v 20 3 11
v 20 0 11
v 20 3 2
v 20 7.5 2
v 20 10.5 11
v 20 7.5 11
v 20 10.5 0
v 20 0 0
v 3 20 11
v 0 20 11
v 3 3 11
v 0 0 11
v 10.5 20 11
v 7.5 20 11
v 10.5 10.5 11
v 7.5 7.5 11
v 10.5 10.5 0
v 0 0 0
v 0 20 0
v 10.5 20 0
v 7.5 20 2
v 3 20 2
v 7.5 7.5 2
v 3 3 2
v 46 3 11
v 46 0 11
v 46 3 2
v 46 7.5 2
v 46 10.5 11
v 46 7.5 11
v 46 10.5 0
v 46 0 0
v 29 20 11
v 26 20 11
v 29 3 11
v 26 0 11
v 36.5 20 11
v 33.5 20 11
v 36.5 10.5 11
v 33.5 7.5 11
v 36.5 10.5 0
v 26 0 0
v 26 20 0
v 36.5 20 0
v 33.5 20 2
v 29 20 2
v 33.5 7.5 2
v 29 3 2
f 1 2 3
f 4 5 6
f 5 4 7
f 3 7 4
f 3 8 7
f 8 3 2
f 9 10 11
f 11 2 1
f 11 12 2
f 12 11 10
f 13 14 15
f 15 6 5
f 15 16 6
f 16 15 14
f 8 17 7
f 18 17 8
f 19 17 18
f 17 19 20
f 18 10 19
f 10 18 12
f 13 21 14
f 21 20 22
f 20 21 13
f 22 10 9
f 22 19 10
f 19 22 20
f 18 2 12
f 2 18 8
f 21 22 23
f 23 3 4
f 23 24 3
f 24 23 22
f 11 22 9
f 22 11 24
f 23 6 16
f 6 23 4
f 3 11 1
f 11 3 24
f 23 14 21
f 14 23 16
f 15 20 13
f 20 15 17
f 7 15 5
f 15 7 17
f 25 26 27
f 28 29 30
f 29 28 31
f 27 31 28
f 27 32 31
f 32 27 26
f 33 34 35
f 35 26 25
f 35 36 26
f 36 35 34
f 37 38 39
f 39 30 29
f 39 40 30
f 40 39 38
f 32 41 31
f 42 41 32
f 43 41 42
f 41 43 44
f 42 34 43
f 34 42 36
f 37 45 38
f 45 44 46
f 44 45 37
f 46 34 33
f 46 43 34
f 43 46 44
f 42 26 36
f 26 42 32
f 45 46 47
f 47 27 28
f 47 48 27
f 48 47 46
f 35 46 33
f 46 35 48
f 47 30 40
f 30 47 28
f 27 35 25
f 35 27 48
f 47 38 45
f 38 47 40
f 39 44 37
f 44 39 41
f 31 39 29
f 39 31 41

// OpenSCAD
//Parametric Corner bracket to hold 2 3/16" thick foam core sheets together
//
//By changing the Gap variable,
//You should be able to use with other material:
//like Acrylic, Glass, Plywood, etc.
//
//As well as 90 corners,
//this can do 7 other angles for 3, 5, 6, 8, 9, 10 & 12 sided structures
//11/21/2015    By: David Bunch

//CUSTOMIZER VARIABLES

//1. Length of Corner Backet
CornerLen = 20;

//2. Width of Corner Bracket
CornerWid = 20;         //For Corner_Ang other than 90, CornerLen is used for both sides

//3. Height of Corner Bracket
CornerHt = 9;

//4. Thickness of Face of Connector
BaseThk = 2.0;

//5. Thickness of Side Walls
Thk = 3;

//6. Gap that Foam core board fits in between
Gap = 4.5;

//7. Angle At Corner (Only 90 when Connect_Qty = 3)
Corner_Ang = 90;        //90 = 4 Sided Structure
                        //120 = 3 Sided
                        //72 = 5 Sided
                        //60 = 6 Sided
                        //Not bothering with 7 sided
                        //45 = 8 Sided
                        //40 = 9 Sided
                        //36 = 10 Sided
                        //Not bothering with 11 Sided
                        //30 = 12 Sided
//8. Length of Foam Core (For Assembly Display)
FC_Len = 100;

//9. Width of Foam Core (For Assembly Display)
FC_Wid = 60;

//10. Height of Foam Core (For Assembly Display)
FC_Ht = 40;

//11. Foam Core Thickness (For Assembly Display)
FC_Thk = Gap;

//12. How many corners to Draw (1,2,4 or 8)
Qty = 2;            //Only used if Assembly = 0

//13. Number of Connections (2 or 3)
Connect_Qty = 2;        //Can only use 3 when Corner Angle is 90

//14. Draw Assembled (1 = Yes, 0 = No)
Assembly = 0;           //1 = Show Assembled, 0 = No

//CUSTOMIZER VARIABLES END

TopMul = (Connect_Qty - 2);         //0 if connecting 2 sides at corner
                                    //1 if connecting 3 sides at corner
echo("TopMul = ",TopMul);
TopThk = (BaseThk * TopMul);
echo("TopThk = ",TopThk);
TopGap = (Gap * TopMul);
echo("TopGap = ",TopGap);
TopTotThk = TopThk + TopGap + (Thk * TopMul);
echo("TopTotThk = ",TopTotThk);

TotHt = BaseThk + TopGap + TopThk + CornerHt;   //Total Height of Corner Bracket
echo("TotHt = ", TotHt);
TotThk = Thk + Gap + Thk;
CutCubeHt = TotHt - TopTotThk + 1;

//Calculate Corner support when printing a Connect 3
Ang45_Wid = sqrt((Thk * Thk) + (Thk * Thk));
Ang45_Len = Ang45_Wid * 2;
Y_Offset = cos(45) * TotHt;

//Calculations for Corner_Ang other than 90
Y_Center = tan(60) * CornerLen;

echo("Y_Center = ",Y_Center);
Corner_Rad = CornerLen / cos(60);
echo("Corner_Rad = ",Corner_Rad);
Corner_Dia = Corner_Rad * 2;
echo("Thk = ", Thk);
Corner_Dia_x2 = Corner_Dia * 2;
Thk_DiagLen = Thk / sin(60);
echo("Thk_DiagLen = ",Thk_DiagLen);
Gap_DiagLen = Gap / sin(60);
echo("Gap_DiagLen = ",Gap_DiagLen);
Sides = 360 / Corner_Ang;
echo("Sides = ", Sides);
In_Rad = Corner_Rad - (Thk_DiagLen * 2) - Gap_DiagLen;
In_Dia = In_Rad * 2;
echo("In_Rad = ",In_Rad);

module Corner()
{
    if (Corner_Ang == 90)
    {
    difference()
    {
        cube([CornerLen,CornerWid,TotHt]);      //Draw the Basic corner to start

        translate([Thk,Thk,BaseThk])        
        cube([CornerLen,Gap,TotHt]);            //Cut out where the length side connects
    
        translate([Thk,Thk,BaseThk])
        cube([Gap,CornerWid,TotHt]);            //Cut out where the Width side connects
        if (Connect_Qty == 2)
        {
            translate([TotThk,TotThk,-1])
            cube([CornerLen,CornerWid,CutCubeHt+1]);  //Cut off the inside corner
        } else {
            translate([TotThk,TotThk,BaseThk+Gap+Thk])
            cube([CornerLen,CornerWid,CutCubeHt]);    //Cut off the inside corner
            translate([TotThk,TotThk,BaseThk])
            cube([CornerLen,CornerWid,Gap]);
        }
    }
    } else {
        difference()
        {
            CylRot(Corner_Rad,TotHt);

            translate([0,0,-1])
            CylRot(In_Dia/2,TotHt+2);

            translate([0,0,BaseThk])
            GapAngCut();
            if (Corner_Ang == 120)
            {
                rotate([0,0,-36])
                translate([0,-Corner_Dia,-1])
                cube([Corner_Dia_x2,Corner_Dia_x2,TotHt+2]);

                rotate([0,0,-84])
                translate([-Corner_Dia_x2,-Corner_Dia,-1])
                cube([Corner_Dia_x2,Corner_Dia_x2,TotHt+2]);
            }
            else if (Corner_Ang == 45)
            {
                rotate([0,0,0])
                translate([0,-Corner_Dia,-1])
                cube([Corner_Dia_x2,Corner_Dia_x2,TotHt+2]);

                rotate([0,0,-45])
                translate([-Corner_Dia_x2,-Corner_Dia,-1])
                cube([Corner_Dia_x2,Corner_Dia_x2,TotHt+2]);
            }
            else
            {
                translate([0,-Corner_Dia,-1])
                cube([Corner_Dia_x2,Corner_Dia_x2,TotHt+2]);

                translate([-Corner_Dia,0,-1])
                cube([Corner_Dia_x2,Corner_Dia_x2,TotHt+2]);

                rotate([0,0,-Corner_Ang])
                translate([-Corner_Dia_x2,-Corner_Dia_x2,-1])
                cube([Corner_Dia_x2,Corner_Dia_x2,TotHt+2]);
            }
    }
}
}

module CylRot(CR_Rad=Corner_Rad,CR_HT=TotHt)
{
    // 90, 60, 36 are correct rotation
    if (Corner_Ang == 72)
    {
        rotate([0,0,18])
        cylinder(r=CR_Rad,h=CR_HT,$fn=Sides);
    }
    else if (Corner_Ang == 45)
    {
        rotate([0,0,22.5])
        cylinder(r=CR_Rad,h=CR_HT,$fn=Sides);
    }
    else if (Corner_Ang == 40)
    {
        rotate([0,0,10])
        cylinder(r=CR_Rad,h=CR_HT,$fn=Sides);
    }
    else if (Corner_Ang == 30)
    {
        rotate([0,0,15])
        cylinder(r=CR_Rad,h=CR_HT,$fn=Sides);
    }
    else if (Corner_Ang == 120)
    {
        rotate([0,0,-30])
        cylinder(r=CR_Rad,h=CR_HT,$fn=Sides);
    }
    else
    {
        rotate([0,0,0])
        cylinder(r=CR_Rad,h=CR_HT,$fn=Sides);
    }
}
module GapAngCut()
{
    if (Corner_Ang == 90)
    {
        echo("Not Doing Anything Here");
    } else {
        difference()
        {
            CylRot(Corner_Rad-Thk_DiagLen,TotHt);

            translate([0,0,-1])
            CylRot(Corner_Rad-Thk_DiagLen-Gap_DiagLen,TotHt+2);

            translate([1,-Corner_Dia,-1])           //go 1mm beyond bracket
            cube([Corner_Dia_x2,Corner_Dia_x2,TotHt+2]);

            translate([-Corner_Dia,0,-1])
            cube([Corner_Dia_x2,Corner_Dia_x2,TotHt+2]);

            rotate([0,0,-Corner_Ang-1])             //go 1 deg beyond bracket
            translate([-Corner_Dia_x2,-Corner_Dia_x2,-1])
            cube([Corner_Dia_x2,Corner_Dia_x2,TotHt+2]);
        }        
    }
}
module Corner_3Connect()
{
    translate([0,0,-Ang45_Wid])
    rotate([45,0,0])
    difference()
    {
        rotate([-45,0,0])       //Easier to calculate cut by rotating back 1st
        difference()
        {
            rotate([45,0,0])
            rotate([0,0,45])
            union()
            {
                Corner();
                rotate([0,0,-45])
                translate([-Ang45_Wid,-TotHt,0])
                cube([Ang45_Len,Ang45_Wid + TotHt,TotHt]);
            }
            translate([0,0,-50 + Ang45_Wid])
            cylinder(d=50,h=50);
            translate([-25,-Y_Offset-50,-1])
            cube([50,50,50]);
        }
        translate([-25,-50,-1])
        cube([50,50,50]);
    }
}
module Corner_3Connect_x2()
{
    Corner_3Connect();
    translate([0,CornerWid+8,0])
    Corner_3Connect();
}
module Corner_3Connect_x4()
{
    Corner_3Connect_x2();
    translate([CornerLen+10,0,0])
    Corner_3Connect_x2();
}
module Corner_x2()
{
    Corner();
    if (Corner_Ang == 90)
    {
        translate([CornerLen+6,0,0])
        Corner();
    } else {
        translate([CornerLen+12,0,0])
        Corner();
    }
}
module Corner_x4()
{
    Corner_x2();
    if (Corner_Ang == 90)
    {
        translate([0,CornerWid+6,0])
        Corner_x2();
    } else {
        translate([0,CornerWid+8,0])
        Corner_x2();
    }
}
module Corners4()
{
    Corner();                                   //Draw Left Corner Bracket
    translate([Thk+FC_Len+Thk,0,0])
    rotate([0,0,90])
    Corner();                                   //Draw Right Corner Bracket
    translate([0,Thk+Gap+FC_Wid+Gap+Thk,0])
    rotate([0,0,-90])
    Corner();                                   //Draw Upper Left Corner Bracket
    translate([Thk+FC_Len+Thk,Thk+Gap+FC_Wid+Gap+Thk,0])
    rotate([0,0,180])
    Corner();                                   //Draw Upper Right Corner Bracket    
}
if (Corner_Ang == 90)
{
if (Assembly == 1)
{
    Corners4();
    translate([0,0,FC_Ht+BaseThk+BaseThk])
    mirror([0,0,1])
    Corners4();

    translate([Thk,Thk,BaseThk])
    %cube([FC_Len,FC_Thk,FC_Ht]);              //Draw Bottom Side Foam Core
    #translate([Thk,Thk+Gap,BaseThk])
    cube([FC_Thk,FC_Wid,FC_Ht]);              //Draw Left side Foam Core
    translate([Thk,Thk+Gap+FC_Wid,BaseThk])
    %cube([FC_Len,FC_Thk,FC_Ht]);              //Draw Top Side Foam Core
    #translate([Thk+FC_Len-Gap,Thk+Gap,BaseThk])
    cube([FC_Thk,FC_Wid,FC_Ht]);              //Draw Right side Foam Core
//Only draw Top & Bottom Foam core if using a 3 connector
    if (Connect_Qty == 3)
    {
        #translate([TotThk,TotThk,BaseThk])
        cube([FC_Len-TotThk-Gap,FC_Wid-Thk-Thk,FC_Thk]);    //Draw Bottom Foam Core
        #translate([TotThk,TotThk,FC_Ht-BaseThk])
        cube([FC_Len-TotThk-Gap,FC_Wid-Thk-Thk,FC_Thk]);    //Draw Top Foam Core
    }
} else {
    if (Connect_Qty == 2)
    {

        if (Qty == 1)
        {
            Corner();
        }
        if (Qty == 2)
        {
            Corner_x2();
        }
        if (Qty == 4)
        {
            Corner_x4();
        }
        if (Qty == 8)
        {
            Corner_x4();
            translate([CornerLen+6+CornerLen+6,0])
            Corner_x4();
        }
    } else {
        if (Corner_Ang == 90)
        {
            if (Qty == 1)
            {
                Corner_3Connect();
            }
            if (Qty == 2)
            {
                Corner_3Connect_x2();
            }
            if (Qty == 4)
            {
                Corner_3Connect_x4();
            }
            if (Qty == 8)
            {
                Corner_3Connect_x4();
                translate([CornerLen+10+CornerLen+10,0,0])
                Corner_3Connect_x4();
            }
        } else {
            echo("********************************************");
            echo("***Corner_Ang MUST be 90 for Connect_Qty = 3");
            echo("********************************************");
        }
    }
}
} else {
    echo("***Calculating other than 90");
            %CylRot(Corner_Rad,TotHt);
        if (Qty == 1)
        {
            Corner();
        }
        if (Qty == 2)
        {
            Corner_x2();
        }
        if (Qty == 4)
        {
            Corner_x4();
        }
        if (Qty == 8)
        {
            Corner_x4();
            translate([CornerLen+10+CornerLen+10,,00])
            Corner_x4();
        }
}
